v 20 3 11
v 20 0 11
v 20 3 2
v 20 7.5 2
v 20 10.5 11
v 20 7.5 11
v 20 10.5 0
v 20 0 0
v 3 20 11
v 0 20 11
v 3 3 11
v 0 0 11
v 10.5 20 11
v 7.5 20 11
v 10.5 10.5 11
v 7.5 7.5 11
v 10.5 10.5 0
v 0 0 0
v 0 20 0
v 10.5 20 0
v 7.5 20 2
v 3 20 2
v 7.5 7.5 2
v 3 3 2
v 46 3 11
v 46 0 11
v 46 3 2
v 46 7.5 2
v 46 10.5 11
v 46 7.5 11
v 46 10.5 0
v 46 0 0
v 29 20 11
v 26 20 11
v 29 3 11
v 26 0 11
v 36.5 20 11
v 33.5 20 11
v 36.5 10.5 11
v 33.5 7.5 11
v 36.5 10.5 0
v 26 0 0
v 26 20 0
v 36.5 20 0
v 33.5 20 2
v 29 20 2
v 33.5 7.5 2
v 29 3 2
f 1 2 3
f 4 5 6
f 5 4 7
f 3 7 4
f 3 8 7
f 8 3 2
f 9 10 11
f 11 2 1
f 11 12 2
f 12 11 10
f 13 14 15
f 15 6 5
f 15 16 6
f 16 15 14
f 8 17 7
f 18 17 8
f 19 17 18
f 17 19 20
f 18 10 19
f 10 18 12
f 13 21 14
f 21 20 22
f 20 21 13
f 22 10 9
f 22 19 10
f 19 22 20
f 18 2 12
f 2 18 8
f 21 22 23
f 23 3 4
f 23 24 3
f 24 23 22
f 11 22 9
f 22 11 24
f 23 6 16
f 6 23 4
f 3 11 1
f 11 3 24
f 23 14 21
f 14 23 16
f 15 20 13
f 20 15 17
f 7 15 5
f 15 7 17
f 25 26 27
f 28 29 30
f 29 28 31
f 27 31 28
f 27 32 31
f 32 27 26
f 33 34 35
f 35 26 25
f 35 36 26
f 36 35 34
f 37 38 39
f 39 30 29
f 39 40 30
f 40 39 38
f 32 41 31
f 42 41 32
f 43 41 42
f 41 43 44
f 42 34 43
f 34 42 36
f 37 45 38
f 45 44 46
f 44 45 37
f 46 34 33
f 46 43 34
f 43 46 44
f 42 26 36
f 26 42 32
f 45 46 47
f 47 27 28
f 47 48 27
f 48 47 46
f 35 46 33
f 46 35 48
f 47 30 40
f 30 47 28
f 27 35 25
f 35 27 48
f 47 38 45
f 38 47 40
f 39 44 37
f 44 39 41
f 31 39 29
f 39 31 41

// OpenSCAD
//Parametric Corner bracket to hold 2 3/16" thick foam core sheets together
//
//By changing the Gap variable,
//You should be able to use with other material:
//like Acrylic, Glass, Plywood, etc.
//
//As well as 90 corners,
//this can do 7 other angles for 3, 5, 6, 8, 9, 10 & 12 sided structures
//11/21/2015    By: David Bunch

//CUSTOMIZER VARIABLES

//1. Length of Corner Backet
CornerLen = 20;

//2. Width of Corner Bracket
CornerWid = 20;         //For Corner_Ang other than 90, CornerLen is used for both sides

//3. Height of Corner Bracket
CornerHt = 9;

//4. Thickness of Face of Connector
BaseThk = 2.0;

//5. Thickness of Side Walls
Thk = 3;

//6. Gap that Foam core board fits in between
Gap = 4.5;

//7. Angle At Corner (Only 90 when Connect_Qty = 3)
Corner_Ang = 90;        //90 = 4 Sided Structure
                        //120 = 3 Sided
                        //72 = 5 Sided
                        //60 = 6 Sided
                        //Not bothering with 7 sided
                        //45 = 8 Sided
                        //40 = 9 Sided
                        //36 = 10 Sided
                        //Not bothering with 11 Sided
                        //30 = 12 Sided
//8. Length of Foam Core (For Assembly Display)
FC_Len = 100;

//9. Width of Foam Core (For Assembly Display)
FC_Wid = 60;

//10. Height of Foam Core (For Assembly Display)
FC_Ht = 40;

//11. Foam Core Thickness (For Assembly Display)
FC_Thk = Gap;

//12. How many corners to Draw (1,2,4 or 8)
Qty = 2;            //Only used if Assembly = 0

//13. Number of Connections (2 or 3)
Connect_Qty = 2;        //Can only use 3 when Corner Angle is 90

//14. Draw Assembled (1 = Yes, 0 = No)
Assembly = 0;           //1 = Show Assembled, 0 = No

//CUSTOMIZER VARIABLES END

TopMul = (Connect_Qty - 2);         //0 if connecting 2 sides at corner
                                    //1 if connecting 3 sides at corner
echo("TopMul = ",TopMul);
TopThk = (BaseThk * TopMul);
echo("TopThk = ",TopThk);
TopGap = (Gap * TopMul);
echo("TopGap = ",TopGap);
TopTotThk = TopThk + TopGap + (Thk * TopMul);
echo("TopTotThk = ",TopTotThk);

TotHt = BaseThk + TopGap + TopThk + CornerHt;   //Total Height of Corner Bracket
echo("TotHt = ", TotHt);
TotThk = Thk + Gap + Thk;
CutCubeHt = TotHt - TopTotThk + 1;

//Calculate Corner support when printing a Connect 3
Ang45_Wid = sqrt((Thk * Thk) + (Thk * Thk));
Ang45_Len = Ang45_Wid * 2;
Y_Offset = cos(45) * TotHt;

//Calculations for Corner_Ang other than 90
Y_Center = tan(60) * CornerLen;

echo("Y_Center = ",Y_Center);
Corner_Rad = CornerLen / cos(60);
echo("Corner_Rad = ",Corner_Rad);
Corner_Dia = Corner_Rad * 2;
echo("Thk = ", Thk);
Corner_Dia_x2 = Corner_Dia * 2;
Thk_DiagLen = Thk / sin(60);
echo("Thk_DiagLen = ",Thk_DiagLen);
Gap_DiagLen = Gap / sin(60);
echo("Gap_DiagLen = ",Gap_DiagLen);
Sides = 360 / Corner_Ang;
echo("Sides = ", Sides);
In_Rad = Corner_Rad - (Thk_DiagLen * 2) - Gap_DiagLen;
In_Dia = In_Rad * 2;
echo("In_Rad = ",In_Rad);

module Corner()
{
    if (Corner_Ang == 90)
    {
    difference()
    {
        cube([CornerLen,CornerWid,TotHt]);      //Draw the Basic corner to start

        translate([Thk,Thk,BaseThk])        
        cube([CornerLen,Gap,TotHt]);            //Cut out where the length side connects
    
        translate([Thk,Thk,BaseThk])
        cube([Gap,CornerWid,TotHt]);            //Cut out where the Width side connects
        if (Connect_Qty == 2)
        {
            translate([TotThk,TotThk,-1])
            cube([CornerLen,CornerWid,CutCubeHt+1]);  //Cut off the inside corner
        } else {
            translate([TotThk,TotThk,BaseThk+Gap+Thk])
            cube([CornerLen,CornerWid,CutCubeHt]);    //Cut off the inside corner
            translate([TotThk,TotThk,BaseThk])
            cube([CornerLen,CornerWid,Gap]);
        }
    }
    } else {
        difference()
        {
            CylRot(Corner_Rad,TotHt);

            translate([0,0,-1])
            CylRot(In_Dia/2,TotHt+2);

            translate([0,0,BaseThk])
            GapAngCut();
            if (Corner_Ang == 120)
            {
                rotate([0,0,-36])
                translate([0,-Corner_Dia,-1])
                cube([Corner_Dia_x2,Corner_Dia_x2,TotHt+2]);

                rotate([0,0,-84])
                translate([-Corner_Dia_x2,-Corner_Dia,-1])
                cube([Corner_Dia_x2,Corner_Dia_x2,TotHt+2]);
            }
            else if (Corner_Ang == 45)
            {
                rotate([0,0,0])
                translate([0,-Corner_Dia,-1])
                cube([Corner_Dia_x2,Corner_Dia_x2,TotHt+2]);

                rotate([0,0,-45])
                translate([-Corner_Dia_x2,-Corner_Dia,-1])
                cube([Corner_Dia_x2,Corner_Dia_x2,TotHt+2]);
            }
            else
            {
                translate([0,-Corner_Dia,-1])
                cube([Corner_Dia_x2,Corner_Dia_x2,TotHt+2]);

                translate([-Corner_Dia,0,-1])
                cube([Corner_Dia_x2,Corner_Dia_x2,TotHt+2]);

                rotate([0,0,-Corner_Ang])
                translate([-Corner_Dia_x2,-Corner_Dia_x2,-1])
                cube([Corner_Dia_x2,Corner_Dia_x2,TotHt+2]);
            }
    }
}
}

module CylRot(CR_Rad=Corner_Rad,CR_HT=TotHt)
{
    // 90, 60, 36 are correct rotation
    if (Corner_Ang == 72)
    {
        rotate([0,0,18])
        cylinder(r=CR_Rad,h=CR_HT,$fn=Sides);
    }
    else if (Corner_Ang == 45)
    {
        rotate([0,0,22.5])
        cylinder(r=CR_Rad,h=CR_HT,$fn=Sides);
    }
    else if (Corner_Ang == 40)
    {
        rotate([0,0,10])
        cylinder(r=CR_Rad,h=CR_HT,$fn=Sides);
    }
    else if (Corner_Ang == 30)
    {
        rotate([0,0,15])
        cylinder(r=CR_Rad,h=CR_HT,$fn=Sides);
    }
    else if (Corner_Ang == 120)
    {
        rotate([0,0,-30])
        cylinder(r=CR_Rad,h=CR_HT,$fn=Sides);
    }
    else
    {
        rotate([0,0,0])
        cylinder(r=CR_Rad,h=CR_HT,$fn=Sides);
    }
}
module GapAngCut()
{
    if (Corner_Ang == 90)
    {
        echo("Not Doing Anything Here");
    } else {
        difference()
        {
            CylRot(Corner_Rad-Thk_DiagLen,TotHt);

            translate([0,0,-1])
            CylRot(Corner_Rad-Thk_DiagLen-Gap_DiagLen,TotHt+2);

            translate([1,-Corner_Dia,-1])           //go 1mm beyond bracket
            cube([Corner_Dia_x2,Corner_Dia_x2,TotHt+2]);

            translate([-Corner_Dia,0,-1])
            cube([Corner_Dia_x2,Corner_Dia_x2,TotHt+2]);

            rotate([0,0,-Corner_Ang-1])             //go 1 deg beyond bracket
            translate([-Corner_Dia_x2,-Corner_Dia_x2,-1])
            cube([Corner_Dia_x2,Corner_Dia_x2,TotHt+2]);
        }        
    }
}
module Corner_3Connect()
{
    translate([0,0,-Ang45_Wid])
    rotate([45,0,0])
    difference()
    {
        rotate([-45,0,0])       //Easier to calculate cut by rotating back 1st
        difference()
        {
            rotate([45,0,0])
            rotate([0,0,45])
            union()
            {
                Corner();
                rotate([0,0,-45])
                translate([-Ang45_Wid,-TotHt,0])
                cube([Ang45_Len,Ang45_Wid + TotHt,TotHt]);
            }
            translate([0,0,-50 + Ang45_Wid])
            cylinder(d=50,h=50);
            translate([-25,-Y_Offset-50,-1])
            cube([50,50,50]);
        }
        translate([-25,-50,-1])
        cube([50,50,50]);
    }
}
module Corner_3Connect_x2()
{
    Corner_3Connect();
    translate([0,CornerWid+8,0])
    Corner_3Connect();
}
module Corner_3Connect_x4()
{
    Corner_3Connect_x2();
    translate([CornerLen+10,0,0])
    Corner_3Connect_x2();
}
module Corner_x2()
{
    Corner();
    if (Corner_Ang == 90)
    {
        translate([CornerLen+6,0,0])
        Corner();
    } else {
        translate([CornerLen+12,0,0])
        Corner();
    }
}
module Corner_x4()
{
    Corner_x2();
    if (Corner_Ang == 90)
    {
        translate([0,CornerWid+6,0])
        Corner_x2();
    } else {
        translate([0,CornerWid+8,0])
        Corner_x2();
    }
}
module Corners4()
{
    Corner();                                   //Draw Left Corner Bracket
    translate([Thk+FC_Len+Thk,0,0])
    rotate([0,0,90])
    Corner();                                   //Draw Right Corner Bracket
    translate([0,Thk+Gap+FC_Wid+Gap+Thk,0])
    rotate([0,0,-90])
    Corner();                                   //Draw Upper Left Corner Bracket
    translate([Thk+FC_Len+Thk,Thk+Gap+FC_Wid+Gap+Thk,0])
    rotate([0,0,180])
    Corner();                                   //Draw Upper Right Corner Bracket    
}
if (Corner_Ang == 90)
{
if (Assembly == 1)
{
    Corners4();
    translate([0,0,FC_Ht+BaseThk+BaseThk])
    mirror([0,0,1])
    Corners4();

    translate([Thk,Thk,BaseThk])
    %cube([FC_Len,FC_Thk,FC_Ht]);              //Draw Bottom Side Foam Core
    #translate([Thk,Thk+Gap,BaseThk])
    cube([FC_Thk,FC_Wid,FC_Ht]);              //Draw Left side Foam Core
    translate([Thk,Thk+Gap+FC_Wid,BaseThk])
    %cube([FC_Len,FC_Thk,FC_Ht]);              //Draw Top Side Foam Core
    #translate([Thk+FC_Len-Gap,Thk+Gap,BaseThk])
    cube([FC_Thk,FC_Wid,FC_Ht]);              //Draw Right side Foam Core
//Only draw Top & Bottom Foam core if using a 3 connector
    if (Connect_Qty == 3)
    {
        #translate([TotThk,TotThk,BaseThk])
        cube([FC_Len-TotThk-Gap,FC_Wid-Thk-Thk,FC_Thk]);    //Draw Bottom Foam Core
        #translate([TotThk,TotThk,FC_Ht-BaseThk])
        cube([FC_Len-TotThk-Gap,FC_Wid-Thk-Thk,FC_Thk]);    //Draw Top Foam Core
    }
} else {
    if (Connect_Qty == 2)
    {

        if (Qty == 1)
        {
            Corner();
        }
        if (Qty == 2)
        {
            Corner_x2();
        }
        if (Qty == 4)
        {
            Corner_x4();
        }
        if (Qty == 8)
        {
            Corner_x4();
            translate([CornerLen+6+CornerLen+6,0])
            Corner_x4();
        }
    } else {
        if (Corner_Ang == 90)
        {
            if (Qty == 1)
            {
                Corner_3Connect();
            }
            if (Qty == 2)
            {
                Corner_3Connect_x2();
            }
            if (Qty == 4)
            {
                Corner_3Connect_x4();
            }
            if (Qty == 8)
            {
                Corner_3Connect_x4();
                translate([CornerLen+10+CornerLen+10,0,0])
                Corner_3Connect_x4();
            }
        } else {
            echo("********************************************");
            echo("***Corner_Ang MUST be 90 for Connect_Qty = 3");
            echo("********************************************");
        }
    }
}
} else {
    echo("***Calculating other than 90");
            %CylRot(Corner_Rad,TotHt);
        if (Qty == 1)
        {
            Corner();
        }
        if (Qty == 2)
        {
            Corner_x2();
        }
        if (Qty == 4)
        {
            Corner_x4();
        }
        if (Qty == 8)
        {
            Corner_x4();
            translate([CornerLen+10+CornerLen+10,,00])
            Corner_x4();
        }
}
